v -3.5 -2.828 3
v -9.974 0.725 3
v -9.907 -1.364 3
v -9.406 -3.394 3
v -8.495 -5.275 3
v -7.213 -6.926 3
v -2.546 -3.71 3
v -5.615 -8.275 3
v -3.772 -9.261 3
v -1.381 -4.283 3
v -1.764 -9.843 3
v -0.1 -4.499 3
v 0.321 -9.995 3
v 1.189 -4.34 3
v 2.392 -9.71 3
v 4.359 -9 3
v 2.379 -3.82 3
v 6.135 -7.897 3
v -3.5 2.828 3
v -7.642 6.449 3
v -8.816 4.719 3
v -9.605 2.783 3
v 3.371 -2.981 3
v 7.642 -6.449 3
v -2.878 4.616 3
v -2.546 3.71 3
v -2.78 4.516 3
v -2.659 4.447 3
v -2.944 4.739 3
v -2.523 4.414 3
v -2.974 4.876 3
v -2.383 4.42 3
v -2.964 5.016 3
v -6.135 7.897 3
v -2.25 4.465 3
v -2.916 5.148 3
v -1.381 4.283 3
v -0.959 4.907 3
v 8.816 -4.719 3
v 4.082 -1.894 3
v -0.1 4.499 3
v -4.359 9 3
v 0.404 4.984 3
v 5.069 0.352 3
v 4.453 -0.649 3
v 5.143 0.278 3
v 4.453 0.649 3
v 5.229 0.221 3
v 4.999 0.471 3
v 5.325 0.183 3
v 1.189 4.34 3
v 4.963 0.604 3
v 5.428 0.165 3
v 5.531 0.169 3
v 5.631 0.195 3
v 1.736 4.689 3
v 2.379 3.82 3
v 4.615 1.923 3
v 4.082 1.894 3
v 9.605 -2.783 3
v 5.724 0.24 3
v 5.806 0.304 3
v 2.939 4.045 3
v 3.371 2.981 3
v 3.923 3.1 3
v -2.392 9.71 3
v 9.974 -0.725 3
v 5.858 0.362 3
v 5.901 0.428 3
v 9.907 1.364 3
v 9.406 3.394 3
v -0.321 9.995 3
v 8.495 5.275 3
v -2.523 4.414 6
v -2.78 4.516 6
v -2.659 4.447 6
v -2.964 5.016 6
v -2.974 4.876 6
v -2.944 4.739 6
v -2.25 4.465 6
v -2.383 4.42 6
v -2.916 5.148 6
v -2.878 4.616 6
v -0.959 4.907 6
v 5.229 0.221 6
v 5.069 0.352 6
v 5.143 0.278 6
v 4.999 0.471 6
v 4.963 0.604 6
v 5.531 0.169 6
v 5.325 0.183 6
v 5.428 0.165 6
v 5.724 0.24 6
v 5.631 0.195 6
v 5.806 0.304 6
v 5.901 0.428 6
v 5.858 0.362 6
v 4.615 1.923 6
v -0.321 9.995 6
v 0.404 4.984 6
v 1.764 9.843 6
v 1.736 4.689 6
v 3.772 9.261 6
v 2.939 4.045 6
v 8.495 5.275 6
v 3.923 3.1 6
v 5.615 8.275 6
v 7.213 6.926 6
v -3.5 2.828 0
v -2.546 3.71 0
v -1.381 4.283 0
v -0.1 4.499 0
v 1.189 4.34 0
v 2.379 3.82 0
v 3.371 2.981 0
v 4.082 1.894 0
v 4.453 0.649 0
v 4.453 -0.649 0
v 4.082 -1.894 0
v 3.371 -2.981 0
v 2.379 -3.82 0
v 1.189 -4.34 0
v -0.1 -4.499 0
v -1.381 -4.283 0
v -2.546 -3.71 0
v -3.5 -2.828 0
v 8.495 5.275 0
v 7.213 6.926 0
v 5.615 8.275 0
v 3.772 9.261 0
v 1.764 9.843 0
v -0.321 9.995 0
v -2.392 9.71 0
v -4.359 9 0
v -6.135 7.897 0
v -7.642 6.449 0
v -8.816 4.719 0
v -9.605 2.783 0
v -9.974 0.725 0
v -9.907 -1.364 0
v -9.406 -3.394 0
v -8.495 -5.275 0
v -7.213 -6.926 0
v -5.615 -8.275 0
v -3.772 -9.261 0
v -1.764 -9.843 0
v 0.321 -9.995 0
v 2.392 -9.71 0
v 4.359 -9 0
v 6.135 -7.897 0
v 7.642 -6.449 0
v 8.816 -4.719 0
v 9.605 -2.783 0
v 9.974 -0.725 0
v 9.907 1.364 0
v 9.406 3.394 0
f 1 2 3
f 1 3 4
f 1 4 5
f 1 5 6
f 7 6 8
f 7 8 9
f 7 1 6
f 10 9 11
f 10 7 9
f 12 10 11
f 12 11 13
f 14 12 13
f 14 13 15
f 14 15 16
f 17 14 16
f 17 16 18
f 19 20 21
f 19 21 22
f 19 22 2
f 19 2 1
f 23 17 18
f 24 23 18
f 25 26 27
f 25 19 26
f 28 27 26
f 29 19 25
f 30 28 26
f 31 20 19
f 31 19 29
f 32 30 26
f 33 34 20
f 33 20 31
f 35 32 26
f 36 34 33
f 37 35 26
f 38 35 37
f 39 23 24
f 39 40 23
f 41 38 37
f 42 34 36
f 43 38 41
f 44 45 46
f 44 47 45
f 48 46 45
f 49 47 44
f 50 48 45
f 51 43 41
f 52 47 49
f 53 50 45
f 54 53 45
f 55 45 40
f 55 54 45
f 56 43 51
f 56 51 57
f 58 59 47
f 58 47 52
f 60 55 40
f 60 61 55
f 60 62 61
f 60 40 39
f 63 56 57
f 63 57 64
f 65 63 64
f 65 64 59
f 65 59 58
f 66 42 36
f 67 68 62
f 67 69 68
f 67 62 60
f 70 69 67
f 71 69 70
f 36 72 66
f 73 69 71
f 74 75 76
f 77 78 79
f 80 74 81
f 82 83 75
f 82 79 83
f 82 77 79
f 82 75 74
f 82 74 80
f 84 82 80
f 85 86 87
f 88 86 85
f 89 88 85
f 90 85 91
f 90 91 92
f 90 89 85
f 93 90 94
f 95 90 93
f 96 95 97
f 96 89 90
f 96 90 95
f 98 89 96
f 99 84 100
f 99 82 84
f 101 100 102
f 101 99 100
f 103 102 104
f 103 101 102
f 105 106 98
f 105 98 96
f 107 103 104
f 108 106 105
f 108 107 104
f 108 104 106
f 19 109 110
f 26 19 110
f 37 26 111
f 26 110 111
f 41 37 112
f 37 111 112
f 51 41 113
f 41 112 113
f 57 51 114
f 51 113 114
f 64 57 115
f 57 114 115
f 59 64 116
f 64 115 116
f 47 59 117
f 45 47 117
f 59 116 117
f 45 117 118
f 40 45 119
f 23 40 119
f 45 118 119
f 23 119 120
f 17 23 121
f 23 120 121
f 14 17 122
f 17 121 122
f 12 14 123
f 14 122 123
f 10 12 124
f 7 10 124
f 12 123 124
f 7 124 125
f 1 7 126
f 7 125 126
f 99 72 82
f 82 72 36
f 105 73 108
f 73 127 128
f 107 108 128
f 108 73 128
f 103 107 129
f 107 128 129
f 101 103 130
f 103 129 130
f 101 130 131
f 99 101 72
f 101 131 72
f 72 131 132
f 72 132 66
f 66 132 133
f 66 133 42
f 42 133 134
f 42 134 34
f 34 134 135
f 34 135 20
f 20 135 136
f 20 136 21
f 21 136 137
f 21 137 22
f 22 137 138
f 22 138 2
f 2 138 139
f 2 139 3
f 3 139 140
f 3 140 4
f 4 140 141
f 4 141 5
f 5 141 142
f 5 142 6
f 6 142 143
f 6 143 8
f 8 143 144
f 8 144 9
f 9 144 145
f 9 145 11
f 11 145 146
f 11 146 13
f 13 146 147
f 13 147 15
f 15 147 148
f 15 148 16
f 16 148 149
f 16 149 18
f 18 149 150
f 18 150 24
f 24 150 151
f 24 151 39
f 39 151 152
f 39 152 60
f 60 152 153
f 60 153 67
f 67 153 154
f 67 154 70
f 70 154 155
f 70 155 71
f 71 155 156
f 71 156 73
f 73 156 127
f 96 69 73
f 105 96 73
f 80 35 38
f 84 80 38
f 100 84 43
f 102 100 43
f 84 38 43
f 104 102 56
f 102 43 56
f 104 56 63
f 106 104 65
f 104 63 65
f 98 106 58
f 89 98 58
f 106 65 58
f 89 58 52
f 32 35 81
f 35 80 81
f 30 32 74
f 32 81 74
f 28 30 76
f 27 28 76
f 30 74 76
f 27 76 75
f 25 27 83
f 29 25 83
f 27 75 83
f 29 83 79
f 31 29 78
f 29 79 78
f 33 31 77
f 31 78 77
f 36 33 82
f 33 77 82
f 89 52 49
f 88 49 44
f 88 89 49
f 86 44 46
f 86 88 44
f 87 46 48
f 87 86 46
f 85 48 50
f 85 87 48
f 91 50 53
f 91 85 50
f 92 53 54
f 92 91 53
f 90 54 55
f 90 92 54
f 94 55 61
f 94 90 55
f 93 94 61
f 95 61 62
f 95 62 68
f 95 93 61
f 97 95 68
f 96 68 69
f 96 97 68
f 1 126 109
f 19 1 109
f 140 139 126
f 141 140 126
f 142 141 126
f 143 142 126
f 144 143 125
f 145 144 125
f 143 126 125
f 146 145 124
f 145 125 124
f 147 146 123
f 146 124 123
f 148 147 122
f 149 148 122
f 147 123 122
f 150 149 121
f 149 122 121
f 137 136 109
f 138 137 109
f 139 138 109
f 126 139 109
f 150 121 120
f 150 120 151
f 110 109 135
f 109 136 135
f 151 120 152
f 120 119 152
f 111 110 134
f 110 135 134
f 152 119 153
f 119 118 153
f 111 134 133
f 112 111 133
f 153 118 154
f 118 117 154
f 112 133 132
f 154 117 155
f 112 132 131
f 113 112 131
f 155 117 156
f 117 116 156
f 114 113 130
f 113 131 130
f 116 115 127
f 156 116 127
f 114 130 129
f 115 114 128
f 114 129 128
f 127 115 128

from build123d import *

# Parameters (mm, degrees)
F1_DEPTH = 3
F2_DEPTH = 6
F3_R     = 0.49999


# Not quite as in the source:
# - a fillet or chamfer is up to 0.001 mm smaller than in the source, because OpenCascade refuses the exact size


with BuildPart() as f1:
    # F0 (on Top) → F1 (new body)
    with BuildSketch(Plane.XY):
        with BuildLine():
            ThreePointArc((-0.3210767755, 9.9948441561), (-6.9566239026, -7.1836887375), (10, 0))
            ThreePointArc((10, 0), (9.616457393, 2.7429449883), (8.4952505583, 5.2754827222))
            Line((8.4952505583, 5.2754827222), (4.4081636669, -2.359680717))
            ThreePointArc((4.4081636669, -2.359680717), (2.359680717, 4.4081636669), (-4.4081636669, 2.359680717))
            Line((-4.4081636669, 2.359680717), (-0.3210767755, 9.9948441561))
        make_face()
        with BuildLine():
            ThreePointArc((-3.5, 2.8284271247), (4.5, 0), (-3.5, -2.8284271247))
            Line((-3.5, -2.8284271247), (-3.5, 2.8284271247))
        make_face(mode=Mode.SUBTRACT)
        with BuildLine():
            Line((4.4081636669, -2.359680717), (8.4952505583, 5.2754827222))
            ThreePointArc((8.4952505583, 5.2754827222), (4.7193614339, 8.8163273338), (-0.3210767755, 9.9948441561))
            Line((-0.3210767755, 9.9948441561), (-4.4081636669, 2.359680717))
            ThreePointArc((-4.4081636669, 2.359680717), (2.359680717, 4.4081636669), (4.4081636669, -2.359680717))
        make_face()
    extrude(amount=F1_DEPTH)

    # F0 (on Top) → F2 (join)
    with BuildSketch(Plane.XY):
        with BuildLine():
            Line((4.4081636669, -2.359680717), (8.4952505583, 5.2754827222))
            ThreePointArc((8.4952505583, 5.2754827222), (4.7193614339, 8.8163273338), (-0.3210767755, 9.9948441561))
            Line((-0.3210767755, 9.9948441561), (-4.4081636669, 2.359680717))
            ThreePointArc((-4.4081636669, 2.359680717), (2.359680717, 4.4081636669), (4.4081636669, -2.359680717))
        make_face()
    extrude(amount=F2_DEPTH)

    # F3 (radius 0.5 in the source; OpenCascade refuses exactly that, so slightly less here)
    f3_edges = [f1.edges().sort_by_distance(p)[0] for p in [
        (-4.408164, 2.359681, 4.5),
        (4.408164, -2.359681, 4.5),
    ]]
    fillet(f3_edges, radius=F3_R)


solid = f1.part
